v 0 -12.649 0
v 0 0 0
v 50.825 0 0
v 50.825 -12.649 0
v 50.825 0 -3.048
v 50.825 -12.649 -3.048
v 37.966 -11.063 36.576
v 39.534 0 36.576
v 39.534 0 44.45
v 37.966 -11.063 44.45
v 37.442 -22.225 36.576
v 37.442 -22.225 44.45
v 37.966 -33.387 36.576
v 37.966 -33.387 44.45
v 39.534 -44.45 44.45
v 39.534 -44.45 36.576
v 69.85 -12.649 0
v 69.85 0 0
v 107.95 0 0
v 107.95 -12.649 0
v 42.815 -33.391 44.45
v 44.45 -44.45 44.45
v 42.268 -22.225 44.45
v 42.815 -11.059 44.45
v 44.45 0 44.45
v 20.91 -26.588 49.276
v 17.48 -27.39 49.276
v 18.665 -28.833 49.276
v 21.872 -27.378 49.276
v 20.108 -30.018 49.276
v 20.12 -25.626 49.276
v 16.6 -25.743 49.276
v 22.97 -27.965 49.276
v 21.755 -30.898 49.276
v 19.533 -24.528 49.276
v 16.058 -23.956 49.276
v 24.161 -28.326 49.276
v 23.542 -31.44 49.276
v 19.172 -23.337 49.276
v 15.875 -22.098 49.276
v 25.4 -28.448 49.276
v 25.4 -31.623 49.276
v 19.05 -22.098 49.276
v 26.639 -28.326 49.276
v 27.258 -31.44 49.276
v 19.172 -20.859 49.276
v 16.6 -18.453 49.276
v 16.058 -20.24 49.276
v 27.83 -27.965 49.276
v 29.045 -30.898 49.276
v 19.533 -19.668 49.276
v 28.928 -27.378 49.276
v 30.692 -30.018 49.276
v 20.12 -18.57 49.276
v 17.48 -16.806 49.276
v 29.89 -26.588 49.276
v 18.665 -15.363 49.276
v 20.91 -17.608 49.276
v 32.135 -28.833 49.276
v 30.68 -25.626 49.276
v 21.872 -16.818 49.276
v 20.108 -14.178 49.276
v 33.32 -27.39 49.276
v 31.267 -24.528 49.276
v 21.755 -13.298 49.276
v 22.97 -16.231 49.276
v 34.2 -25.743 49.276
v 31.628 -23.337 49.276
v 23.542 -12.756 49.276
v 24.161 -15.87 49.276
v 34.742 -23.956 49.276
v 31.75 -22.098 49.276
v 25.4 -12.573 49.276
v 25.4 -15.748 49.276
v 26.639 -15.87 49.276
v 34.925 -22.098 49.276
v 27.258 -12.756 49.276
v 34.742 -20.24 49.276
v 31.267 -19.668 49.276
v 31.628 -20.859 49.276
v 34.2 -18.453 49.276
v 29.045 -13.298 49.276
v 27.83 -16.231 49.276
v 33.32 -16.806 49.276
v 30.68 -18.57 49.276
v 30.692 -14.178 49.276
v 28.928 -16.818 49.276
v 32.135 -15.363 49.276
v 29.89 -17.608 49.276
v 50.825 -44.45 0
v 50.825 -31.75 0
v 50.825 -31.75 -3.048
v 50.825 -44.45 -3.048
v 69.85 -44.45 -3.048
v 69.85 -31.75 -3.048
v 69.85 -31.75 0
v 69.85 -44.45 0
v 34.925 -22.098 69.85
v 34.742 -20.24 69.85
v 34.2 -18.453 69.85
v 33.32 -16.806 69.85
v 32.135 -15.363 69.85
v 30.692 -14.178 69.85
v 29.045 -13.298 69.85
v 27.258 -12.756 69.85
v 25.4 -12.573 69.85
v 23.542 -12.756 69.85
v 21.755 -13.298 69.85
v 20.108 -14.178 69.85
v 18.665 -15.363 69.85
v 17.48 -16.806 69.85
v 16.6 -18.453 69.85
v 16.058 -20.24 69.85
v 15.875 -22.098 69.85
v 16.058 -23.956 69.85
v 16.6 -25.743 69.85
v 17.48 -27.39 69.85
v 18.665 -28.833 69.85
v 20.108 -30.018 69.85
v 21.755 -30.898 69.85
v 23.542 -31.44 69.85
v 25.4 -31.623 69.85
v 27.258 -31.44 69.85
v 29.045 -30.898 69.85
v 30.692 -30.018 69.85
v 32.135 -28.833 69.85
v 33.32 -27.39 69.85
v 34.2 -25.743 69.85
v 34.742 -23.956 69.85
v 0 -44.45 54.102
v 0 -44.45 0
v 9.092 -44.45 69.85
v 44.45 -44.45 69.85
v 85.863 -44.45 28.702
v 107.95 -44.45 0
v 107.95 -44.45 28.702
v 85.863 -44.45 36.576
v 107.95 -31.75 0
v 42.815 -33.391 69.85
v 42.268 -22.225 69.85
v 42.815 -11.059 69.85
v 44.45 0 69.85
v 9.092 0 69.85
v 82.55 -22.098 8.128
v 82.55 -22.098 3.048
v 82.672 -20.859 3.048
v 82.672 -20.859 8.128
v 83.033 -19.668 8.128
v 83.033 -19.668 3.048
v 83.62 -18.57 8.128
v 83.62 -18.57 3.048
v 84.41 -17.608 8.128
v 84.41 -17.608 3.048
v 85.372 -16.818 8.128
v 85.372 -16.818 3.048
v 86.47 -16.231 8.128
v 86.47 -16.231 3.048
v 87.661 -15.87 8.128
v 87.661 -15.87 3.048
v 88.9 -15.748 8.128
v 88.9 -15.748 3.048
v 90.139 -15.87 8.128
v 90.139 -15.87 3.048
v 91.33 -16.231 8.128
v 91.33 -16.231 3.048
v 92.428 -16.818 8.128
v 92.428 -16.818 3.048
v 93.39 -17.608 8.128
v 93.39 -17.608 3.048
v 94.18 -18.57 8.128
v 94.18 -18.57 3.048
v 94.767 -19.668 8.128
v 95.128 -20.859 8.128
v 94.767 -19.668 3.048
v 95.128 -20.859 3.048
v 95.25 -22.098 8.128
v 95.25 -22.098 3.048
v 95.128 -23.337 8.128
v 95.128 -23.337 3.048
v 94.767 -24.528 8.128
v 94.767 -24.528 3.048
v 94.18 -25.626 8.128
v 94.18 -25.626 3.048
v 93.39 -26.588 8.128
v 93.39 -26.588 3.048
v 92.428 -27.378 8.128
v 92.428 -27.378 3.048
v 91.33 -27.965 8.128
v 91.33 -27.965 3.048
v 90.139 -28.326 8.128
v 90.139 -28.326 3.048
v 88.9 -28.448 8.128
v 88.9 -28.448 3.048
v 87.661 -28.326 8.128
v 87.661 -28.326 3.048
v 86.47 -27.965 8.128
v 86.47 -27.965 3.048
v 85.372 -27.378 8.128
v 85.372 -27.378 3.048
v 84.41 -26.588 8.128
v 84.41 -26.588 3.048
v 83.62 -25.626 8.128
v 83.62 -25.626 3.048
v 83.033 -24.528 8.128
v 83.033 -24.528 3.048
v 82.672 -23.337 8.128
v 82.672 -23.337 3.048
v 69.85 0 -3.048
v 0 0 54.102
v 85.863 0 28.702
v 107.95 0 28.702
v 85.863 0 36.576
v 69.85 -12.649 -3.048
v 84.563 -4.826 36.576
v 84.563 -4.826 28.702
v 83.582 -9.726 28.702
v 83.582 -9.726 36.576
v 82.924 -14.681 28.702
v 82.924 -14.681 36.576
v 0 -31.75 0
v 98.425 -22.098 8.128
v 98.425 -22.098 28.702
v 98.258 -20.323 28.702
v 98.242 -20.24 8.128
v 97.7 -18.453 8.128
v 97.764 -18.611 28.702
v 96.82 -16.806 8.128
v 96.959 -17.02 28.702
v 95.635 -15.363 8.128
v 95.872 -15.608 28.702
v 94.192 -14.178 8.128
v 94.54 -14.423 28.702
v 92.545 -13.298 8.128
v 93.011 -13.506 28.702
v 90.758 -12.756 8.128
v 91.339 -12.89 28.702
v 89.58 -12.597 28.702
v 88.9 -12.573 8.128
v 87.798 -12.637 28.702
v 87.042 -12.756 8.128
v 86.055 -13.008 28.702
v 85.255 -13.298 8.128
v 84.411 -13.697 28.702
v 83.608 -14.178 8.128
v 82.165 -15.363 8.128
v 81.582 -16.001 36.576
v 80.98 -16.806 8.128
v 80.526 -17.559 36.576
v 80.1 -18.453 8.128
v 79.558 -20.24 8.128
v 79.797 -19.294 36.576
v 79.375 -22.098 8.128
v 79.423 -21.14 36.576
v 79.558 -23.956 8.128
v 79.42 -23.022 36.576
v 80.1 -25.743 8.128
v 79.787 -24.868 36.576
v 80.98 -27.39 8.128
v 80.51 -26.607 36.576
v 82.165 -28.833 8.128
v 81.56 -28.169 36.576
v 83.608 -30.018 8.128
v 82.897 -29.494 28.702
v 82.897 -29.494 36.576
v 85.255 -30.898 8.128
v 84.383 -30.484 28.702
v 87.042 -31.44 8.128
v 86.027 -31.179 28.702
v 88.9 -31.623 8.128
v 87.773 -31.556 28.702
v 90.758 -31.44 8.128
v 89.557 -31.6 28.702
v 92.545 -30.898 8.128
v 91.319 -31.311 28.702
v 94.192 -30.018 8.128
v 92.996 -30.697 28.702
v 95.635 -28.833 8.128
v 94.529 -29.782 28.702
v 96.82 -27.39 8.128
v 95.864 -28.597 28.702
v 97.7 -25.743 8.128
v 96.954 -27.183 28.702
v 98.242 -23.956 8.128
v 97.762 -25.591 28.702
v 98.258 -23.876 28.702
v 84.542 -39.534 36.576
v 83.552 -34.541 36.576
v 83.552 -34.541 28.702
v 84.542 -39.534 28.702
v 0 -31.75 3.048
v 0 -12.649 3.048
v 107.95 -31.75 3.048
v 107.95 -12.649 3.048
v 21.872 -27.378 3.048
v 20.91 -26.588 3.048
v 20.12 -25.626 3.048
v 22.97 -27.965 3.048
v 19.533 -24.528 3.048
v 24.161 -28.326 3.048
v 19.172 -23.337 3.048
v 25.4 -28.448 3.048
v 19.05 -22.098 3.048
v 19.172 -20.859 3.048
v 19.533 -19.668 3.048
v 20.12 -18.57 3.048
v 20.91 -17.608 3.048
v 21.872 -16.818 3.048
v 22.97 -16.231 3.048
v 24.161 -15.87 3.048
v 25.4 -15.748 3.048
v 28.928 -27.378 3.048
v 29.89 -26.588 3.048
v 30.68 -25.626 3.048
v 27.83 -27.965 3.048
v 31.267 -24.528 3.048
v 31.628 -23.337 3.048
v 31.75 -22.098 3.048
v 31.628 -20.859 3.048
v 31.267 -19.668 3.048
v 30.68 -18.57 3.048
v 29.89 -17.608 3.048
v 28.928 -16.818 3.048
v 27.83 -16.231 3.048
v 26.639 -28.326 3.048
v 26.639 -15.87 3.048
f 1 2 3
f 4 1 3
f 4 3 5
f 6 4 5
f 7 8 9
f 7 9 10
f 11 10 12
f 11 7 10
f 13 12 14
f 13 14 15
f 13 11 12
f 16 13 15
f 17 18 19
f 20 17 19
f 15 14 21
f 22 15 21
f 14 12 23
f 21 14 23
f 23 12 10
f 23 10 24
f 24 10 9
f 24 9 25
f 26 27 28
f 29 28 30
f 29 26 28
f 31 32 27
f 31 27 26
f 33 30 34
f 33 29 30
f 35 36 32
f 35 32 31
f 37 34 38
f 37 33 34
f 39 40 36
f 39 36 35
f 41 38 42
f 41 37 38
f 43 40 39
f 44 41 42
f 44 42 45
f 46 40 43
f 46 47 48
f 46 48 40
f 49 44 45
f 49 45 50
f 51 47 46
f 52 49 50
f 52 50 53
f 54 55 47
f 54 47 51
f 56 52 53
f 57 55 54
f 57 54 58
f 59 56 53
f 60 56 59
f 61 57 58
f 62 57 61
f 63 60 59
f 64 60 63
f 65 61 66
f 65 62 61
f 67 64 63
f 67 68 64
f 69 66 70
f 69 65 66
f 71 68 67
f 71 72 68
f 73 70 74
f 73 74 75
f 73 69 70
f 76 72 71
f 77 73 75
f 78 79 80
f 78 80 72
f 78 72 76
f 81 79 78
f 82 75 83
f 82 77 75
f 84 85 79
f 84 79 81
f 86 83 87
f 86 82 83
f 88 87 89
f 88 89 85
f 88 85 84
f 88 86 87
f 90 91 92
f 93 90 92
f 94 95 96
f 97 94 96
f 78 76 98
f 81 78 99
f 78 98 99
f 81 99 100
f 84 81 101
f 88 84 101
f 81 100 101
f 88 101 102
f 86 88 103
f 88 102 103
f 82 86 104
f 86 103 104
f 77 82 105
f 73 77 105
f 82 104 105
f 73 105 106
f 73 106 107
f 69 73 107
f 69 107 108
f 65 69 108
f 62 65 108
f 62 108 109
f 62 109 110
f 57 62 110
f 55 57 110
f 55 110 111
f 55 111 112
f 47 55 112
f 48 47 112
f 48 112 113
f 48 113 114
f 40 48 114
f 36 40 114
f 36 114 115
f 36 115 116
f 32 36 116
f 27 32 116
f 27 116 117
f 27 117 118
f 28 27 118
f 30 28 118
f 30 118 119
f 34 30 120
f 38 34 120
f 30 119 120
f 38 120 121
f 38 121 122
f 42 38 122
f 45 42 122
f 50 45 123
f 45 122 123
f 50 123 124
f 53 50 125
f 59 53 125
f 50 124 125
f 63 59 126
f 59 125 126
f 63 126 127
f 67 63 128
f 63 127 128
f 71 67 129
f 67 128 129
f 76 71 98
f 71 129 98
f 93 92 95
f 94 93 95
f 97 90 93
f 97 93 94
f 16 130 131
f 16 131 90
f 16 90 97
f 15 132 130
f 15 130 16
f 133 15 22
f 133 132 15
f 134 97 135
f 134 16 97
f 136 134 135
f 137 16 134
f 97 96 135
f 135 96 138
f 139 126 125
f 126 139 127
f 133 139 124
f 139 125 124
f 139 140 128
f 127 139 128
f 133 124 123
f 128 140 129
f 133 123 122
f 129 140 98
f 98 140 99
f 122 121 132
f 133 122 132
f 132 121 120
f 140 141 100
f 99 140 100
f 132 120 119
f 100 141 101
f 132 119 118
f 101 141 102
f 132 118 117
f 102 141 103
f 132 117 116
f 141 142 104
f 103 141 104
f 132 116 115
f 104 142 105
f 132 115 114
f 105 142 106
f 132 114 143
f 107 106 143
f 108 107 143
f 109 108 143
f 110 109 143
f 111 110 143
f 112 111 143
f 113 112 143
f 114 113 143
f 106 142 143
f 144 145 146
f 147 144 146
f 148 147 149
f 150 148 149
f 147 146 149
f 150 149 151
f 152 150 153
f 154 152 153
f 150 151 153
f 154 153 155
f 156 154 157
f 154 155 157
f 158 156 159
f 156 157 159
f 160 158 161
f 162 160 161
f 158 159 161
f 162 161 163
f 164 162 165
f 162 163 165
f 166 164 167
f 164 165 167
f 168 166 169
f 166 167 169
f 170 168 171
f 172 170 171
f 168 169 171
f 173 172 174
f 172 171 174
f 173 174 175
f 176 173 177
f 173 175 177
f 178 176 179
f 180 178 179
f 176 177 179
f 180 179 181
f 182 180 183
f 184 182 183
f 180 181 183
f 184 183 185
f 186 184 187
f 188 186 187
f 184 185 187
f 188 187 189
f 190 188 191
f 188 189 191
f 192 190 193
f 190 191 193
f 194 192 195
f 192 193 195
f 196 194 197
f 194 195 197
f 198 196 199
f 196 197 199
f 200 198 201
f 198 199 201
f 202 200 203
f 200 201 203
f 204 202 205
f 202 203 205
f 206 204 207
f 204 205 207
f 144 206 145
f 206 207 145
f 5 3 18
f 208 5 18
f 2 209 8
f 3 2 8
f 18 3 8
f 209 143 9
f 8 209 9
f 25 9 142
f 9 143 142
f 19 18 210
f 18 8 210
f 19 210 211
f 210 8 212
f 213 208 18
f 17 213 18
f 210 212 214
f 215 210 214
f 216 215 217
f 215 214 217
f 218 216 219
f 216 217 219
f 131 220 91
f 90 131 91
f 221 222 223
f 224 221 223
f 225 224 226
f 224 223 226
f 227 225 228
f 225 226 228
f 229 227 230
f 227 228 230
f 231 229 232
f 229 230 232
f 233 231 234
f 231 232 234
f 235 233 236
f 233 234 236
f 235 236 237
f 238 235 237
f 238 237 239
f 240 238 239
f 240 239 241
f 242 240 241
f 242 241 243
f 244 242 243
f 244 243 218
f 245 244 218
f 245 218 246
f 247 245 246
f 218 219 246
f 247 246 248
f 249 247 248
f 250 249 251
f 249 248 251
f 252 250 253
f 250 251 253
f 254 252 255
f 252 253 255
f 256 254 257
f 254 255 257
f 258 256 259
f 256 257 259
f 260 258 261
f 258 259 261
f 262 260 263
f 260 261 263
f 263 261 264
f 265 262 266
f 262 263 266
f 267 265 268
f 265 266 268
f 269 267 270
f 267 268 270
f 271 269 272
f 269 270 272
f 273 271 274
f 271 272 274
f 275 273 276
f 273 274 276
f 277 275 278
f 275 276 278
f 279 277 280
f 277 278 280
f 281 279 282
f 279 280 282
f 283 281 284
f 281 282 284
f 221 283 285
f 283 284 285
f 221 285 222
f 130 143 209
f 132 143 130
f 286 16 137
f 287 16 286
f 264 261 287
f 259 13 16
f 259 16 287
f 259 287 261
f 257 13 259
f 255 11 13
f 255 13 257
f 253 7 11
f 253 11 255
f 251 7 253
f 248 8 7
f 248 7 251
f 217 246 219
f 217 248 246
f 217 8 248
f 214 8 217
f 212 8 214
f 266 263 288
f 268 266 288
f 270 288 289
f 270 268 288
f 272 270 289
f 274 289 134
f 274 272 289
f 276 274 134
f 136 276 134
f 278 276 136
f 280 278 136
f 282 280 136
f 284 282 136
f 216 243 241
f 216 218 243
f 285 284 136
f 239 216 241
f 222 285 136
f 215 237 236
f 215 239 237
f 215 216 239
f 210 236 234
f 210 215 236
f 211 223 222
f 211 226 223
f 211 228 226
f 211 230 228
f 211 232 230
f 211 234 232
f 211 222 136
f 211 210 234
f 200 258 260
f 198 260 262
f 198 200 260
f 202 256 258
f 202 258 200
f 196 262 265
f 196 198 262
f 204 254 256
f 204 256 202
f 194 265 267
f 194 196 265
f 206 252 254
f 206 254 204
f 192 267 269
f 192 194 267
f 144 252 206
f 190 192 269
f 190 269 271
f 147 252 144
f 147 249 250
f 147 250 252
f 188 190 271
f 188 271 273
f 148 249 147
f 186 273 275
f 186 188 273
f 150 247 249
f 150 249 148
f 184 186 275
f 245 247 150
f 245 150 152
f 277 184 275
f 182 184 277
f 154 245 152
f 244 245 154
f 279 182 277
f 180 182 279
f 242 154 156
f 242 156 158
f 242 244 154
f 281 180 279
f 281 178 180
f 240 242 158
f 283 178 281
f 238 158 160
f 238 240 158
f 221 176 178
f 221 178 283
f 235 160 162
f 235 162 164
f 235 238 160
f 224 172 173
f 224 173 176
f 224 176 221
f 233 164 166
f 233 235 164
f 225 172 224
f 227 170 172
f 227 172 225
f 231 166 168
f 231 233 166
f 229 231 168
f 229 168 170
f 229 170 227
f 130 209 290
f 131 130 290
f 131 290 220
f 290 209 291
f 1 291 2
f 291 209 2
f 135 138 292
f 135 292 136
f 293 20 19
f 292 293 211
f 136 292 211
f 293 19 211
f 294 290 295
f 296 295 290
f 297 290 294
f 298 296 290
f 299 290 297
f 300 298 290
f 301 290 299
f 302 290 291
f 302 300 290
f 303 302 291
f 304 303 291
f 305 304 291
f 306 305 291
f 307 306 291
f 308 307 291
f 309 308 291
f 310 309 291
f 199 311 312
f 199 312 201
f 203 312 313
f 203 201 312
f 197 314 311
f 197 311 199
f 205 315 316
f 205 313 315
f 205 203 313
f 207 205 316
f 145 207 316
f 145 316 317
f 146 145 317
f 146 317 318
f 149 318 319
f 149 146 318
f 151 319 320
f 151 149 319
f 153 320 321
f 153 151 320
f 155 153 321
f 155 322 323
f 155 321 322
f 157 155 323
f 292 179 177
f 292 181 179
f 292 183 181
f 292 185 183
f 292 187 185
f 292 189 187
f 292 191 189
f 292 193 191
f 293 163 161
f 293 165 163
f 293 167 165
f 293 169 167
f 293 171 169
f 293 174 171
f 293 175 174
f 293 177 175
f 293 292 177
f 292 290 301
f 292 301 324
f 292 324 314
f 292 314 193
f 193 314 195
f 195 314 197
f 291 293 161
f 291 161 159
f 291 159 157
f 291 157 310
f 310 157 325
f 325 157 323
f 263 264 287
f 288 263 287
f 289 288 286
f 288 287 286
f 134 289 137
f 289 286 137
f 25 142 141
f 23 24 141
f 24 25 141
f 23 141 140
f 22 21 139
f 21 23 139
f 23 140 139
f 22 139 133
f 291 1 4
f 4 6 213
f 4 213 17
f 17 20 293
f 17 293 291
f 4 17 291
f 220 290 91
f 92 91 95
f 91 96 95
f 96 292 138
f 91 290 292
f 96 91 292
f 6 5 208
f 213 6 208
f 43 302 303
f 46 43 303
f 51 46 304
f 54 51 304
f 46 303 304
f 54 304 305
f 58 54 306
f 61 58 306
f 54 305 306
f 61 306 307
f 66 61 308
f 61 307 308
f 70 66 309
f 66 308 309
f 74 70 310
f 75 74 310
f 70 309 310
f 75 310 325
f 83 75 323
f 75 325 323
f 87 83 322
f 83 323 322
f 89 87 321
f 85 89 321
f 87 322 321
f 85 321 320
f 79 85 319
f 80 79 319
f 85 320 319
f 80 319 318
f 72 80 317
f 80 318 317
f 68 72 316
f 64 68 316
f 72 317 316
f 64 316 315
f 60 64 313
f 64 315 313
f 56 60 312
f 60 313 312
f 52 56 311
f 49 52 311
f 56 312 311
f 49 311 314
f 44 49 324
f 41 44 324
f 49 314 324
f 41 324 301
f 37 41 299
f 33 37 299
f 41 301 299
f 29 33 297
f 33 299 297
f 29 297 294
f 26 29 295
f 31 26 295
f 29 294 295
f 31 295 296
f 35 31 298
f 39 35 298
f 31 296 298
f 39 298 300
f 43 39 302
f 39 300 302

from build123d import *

# Parameters (mm, degrees)
F1_DEPTH        = 44.45
F3_DEPTH        = 7.874
F5_DEPTH        = 33.274
F7_DEPTH        = 7.874
F9_D            = 12.7
F9_CBORE_D      = 19.05
F9_CBORE_DEPTH  = 20.574
F11_D           = 12.7
F11_START       = 7.874
F11_CBORE_D     = 19.05
F11_CBORE_DEPTH = 20.574
F12_W           = 19.1008
F12_H           = 3.048
F13_DEPTH       = 107.951
F14_SIZE2       = 9.0921120392
F14_SIZE        = 15.748


with BuildPart() as f1:
    # F0 (on Front) → F1 (new body)
    with BuildSketch(Plane.XZ):
        Polygon((0, 69.85), (0, 0), (50.8254, 0), (50.8254, -3.048), (69.85, -3.048), (69.85, 0), (107.95, 0), (107.95, 28.702), (86.0188790381, 28.702), (86.0188790381, 36.576), (44.45, 36.576), (44.45, 69.85), align=None)
    extrude(amount=F1_DEPTH)

    # F2 (on face) → F3 (cut, through all)
    with BuildSketch(Plane.XY.offset(36.576)):
        with BuildLine():
            Line((86.0188790381, 0), (85.8631742014, 0))
            ThreePointArc((85.8631742014, 0), (82.55, -22.225), (85.8631742014, -44.45))
            Line((85.8631742014, -44.45), (86.0188790381, -44.45))
            Line((86.0188790381, -44.45), (86.0188790381, 0))
        make_face()
    extrude(amount=-F3_DEPTH, mode=Mode.SUBTRACT)

    # F4 (on face) → F5 (cut, through all)
    with BuildSketch(Plane.XY.offset(69.85)):
        with BuildLine():
            Line((44.45, -44.45), (44.45, 0))
            ThreePointArc((44.45, 0), (42.2684167521, -22.225), (44.45, -44.45))
        make_face()
    extrude(amount=-F5_DEPTH, mode=Mode.SUBTRACT)

    # F6 (on face) → F7 (cut)
    with BuildSketch(Plane.XY.offset(36.576)):
        with BuildLine():
            Line((44.45, 0), (39.5340062096, 0))
            ThreePointArc((39.5340062096, 0), (37.442416752, -22.225), (39.5340062096, -44.45))
            Line((39.5340062096, -44.45), (44.45, -44.45))
            ThreePointArc((44.45, -44.45), (42.2684167521, -22.225), (44.45, 0))
        make_face()
    extrude(amount=F7_DEPTH, mode=Mode.SUBTRACT)

    # F9 (through all)
    with Locations(Plane.XY.offset(69.85)):
        with Locations((25.4, -22.098)):
            CounterBoreHole(F9_D / 2, F9_CBORE_D / 2, F9_CBORE_DEPTH)

    # F11 (through all)
    # its depths count from where the whole tool has entered the part; down to there all is cleared
    with Locations(Plane.XY.offset(36.576).offset(-F11_START)):
        with Locations((88.9, -22.098)):
            CounterBoreHole(F11_D / 2, F11_CBORE_D / 2, F11_CBORE_DEPTH)

    # F12 (on face) → F13 (cut, through all)
    with BuildSketch(Plane.YZ.offset(107.95)):
        with Locations((-22.1996, 1.524)):
            Rectangle(F12_W, F12_H)
        with Locations((-22.1996, -1.524)):
            Rectangle(F12_W, F12_H)
    extrude(amount=-F13_DEPTH, mode=Mode.SUBTRACT)

    # F14
    f14_edges = [f1.edges().sort_by_distance(p)[0] for p in [
        (0, -22.225, 69.85),
    ]]
    f14_side = f1.faces().sort_by_distance((0, -22.225485, 35.563276))[0]
    chamfer(f14_edges, length=F14_SIZE, length2=F14_SIZE2, reference=f14_side)


solid = f1.part
